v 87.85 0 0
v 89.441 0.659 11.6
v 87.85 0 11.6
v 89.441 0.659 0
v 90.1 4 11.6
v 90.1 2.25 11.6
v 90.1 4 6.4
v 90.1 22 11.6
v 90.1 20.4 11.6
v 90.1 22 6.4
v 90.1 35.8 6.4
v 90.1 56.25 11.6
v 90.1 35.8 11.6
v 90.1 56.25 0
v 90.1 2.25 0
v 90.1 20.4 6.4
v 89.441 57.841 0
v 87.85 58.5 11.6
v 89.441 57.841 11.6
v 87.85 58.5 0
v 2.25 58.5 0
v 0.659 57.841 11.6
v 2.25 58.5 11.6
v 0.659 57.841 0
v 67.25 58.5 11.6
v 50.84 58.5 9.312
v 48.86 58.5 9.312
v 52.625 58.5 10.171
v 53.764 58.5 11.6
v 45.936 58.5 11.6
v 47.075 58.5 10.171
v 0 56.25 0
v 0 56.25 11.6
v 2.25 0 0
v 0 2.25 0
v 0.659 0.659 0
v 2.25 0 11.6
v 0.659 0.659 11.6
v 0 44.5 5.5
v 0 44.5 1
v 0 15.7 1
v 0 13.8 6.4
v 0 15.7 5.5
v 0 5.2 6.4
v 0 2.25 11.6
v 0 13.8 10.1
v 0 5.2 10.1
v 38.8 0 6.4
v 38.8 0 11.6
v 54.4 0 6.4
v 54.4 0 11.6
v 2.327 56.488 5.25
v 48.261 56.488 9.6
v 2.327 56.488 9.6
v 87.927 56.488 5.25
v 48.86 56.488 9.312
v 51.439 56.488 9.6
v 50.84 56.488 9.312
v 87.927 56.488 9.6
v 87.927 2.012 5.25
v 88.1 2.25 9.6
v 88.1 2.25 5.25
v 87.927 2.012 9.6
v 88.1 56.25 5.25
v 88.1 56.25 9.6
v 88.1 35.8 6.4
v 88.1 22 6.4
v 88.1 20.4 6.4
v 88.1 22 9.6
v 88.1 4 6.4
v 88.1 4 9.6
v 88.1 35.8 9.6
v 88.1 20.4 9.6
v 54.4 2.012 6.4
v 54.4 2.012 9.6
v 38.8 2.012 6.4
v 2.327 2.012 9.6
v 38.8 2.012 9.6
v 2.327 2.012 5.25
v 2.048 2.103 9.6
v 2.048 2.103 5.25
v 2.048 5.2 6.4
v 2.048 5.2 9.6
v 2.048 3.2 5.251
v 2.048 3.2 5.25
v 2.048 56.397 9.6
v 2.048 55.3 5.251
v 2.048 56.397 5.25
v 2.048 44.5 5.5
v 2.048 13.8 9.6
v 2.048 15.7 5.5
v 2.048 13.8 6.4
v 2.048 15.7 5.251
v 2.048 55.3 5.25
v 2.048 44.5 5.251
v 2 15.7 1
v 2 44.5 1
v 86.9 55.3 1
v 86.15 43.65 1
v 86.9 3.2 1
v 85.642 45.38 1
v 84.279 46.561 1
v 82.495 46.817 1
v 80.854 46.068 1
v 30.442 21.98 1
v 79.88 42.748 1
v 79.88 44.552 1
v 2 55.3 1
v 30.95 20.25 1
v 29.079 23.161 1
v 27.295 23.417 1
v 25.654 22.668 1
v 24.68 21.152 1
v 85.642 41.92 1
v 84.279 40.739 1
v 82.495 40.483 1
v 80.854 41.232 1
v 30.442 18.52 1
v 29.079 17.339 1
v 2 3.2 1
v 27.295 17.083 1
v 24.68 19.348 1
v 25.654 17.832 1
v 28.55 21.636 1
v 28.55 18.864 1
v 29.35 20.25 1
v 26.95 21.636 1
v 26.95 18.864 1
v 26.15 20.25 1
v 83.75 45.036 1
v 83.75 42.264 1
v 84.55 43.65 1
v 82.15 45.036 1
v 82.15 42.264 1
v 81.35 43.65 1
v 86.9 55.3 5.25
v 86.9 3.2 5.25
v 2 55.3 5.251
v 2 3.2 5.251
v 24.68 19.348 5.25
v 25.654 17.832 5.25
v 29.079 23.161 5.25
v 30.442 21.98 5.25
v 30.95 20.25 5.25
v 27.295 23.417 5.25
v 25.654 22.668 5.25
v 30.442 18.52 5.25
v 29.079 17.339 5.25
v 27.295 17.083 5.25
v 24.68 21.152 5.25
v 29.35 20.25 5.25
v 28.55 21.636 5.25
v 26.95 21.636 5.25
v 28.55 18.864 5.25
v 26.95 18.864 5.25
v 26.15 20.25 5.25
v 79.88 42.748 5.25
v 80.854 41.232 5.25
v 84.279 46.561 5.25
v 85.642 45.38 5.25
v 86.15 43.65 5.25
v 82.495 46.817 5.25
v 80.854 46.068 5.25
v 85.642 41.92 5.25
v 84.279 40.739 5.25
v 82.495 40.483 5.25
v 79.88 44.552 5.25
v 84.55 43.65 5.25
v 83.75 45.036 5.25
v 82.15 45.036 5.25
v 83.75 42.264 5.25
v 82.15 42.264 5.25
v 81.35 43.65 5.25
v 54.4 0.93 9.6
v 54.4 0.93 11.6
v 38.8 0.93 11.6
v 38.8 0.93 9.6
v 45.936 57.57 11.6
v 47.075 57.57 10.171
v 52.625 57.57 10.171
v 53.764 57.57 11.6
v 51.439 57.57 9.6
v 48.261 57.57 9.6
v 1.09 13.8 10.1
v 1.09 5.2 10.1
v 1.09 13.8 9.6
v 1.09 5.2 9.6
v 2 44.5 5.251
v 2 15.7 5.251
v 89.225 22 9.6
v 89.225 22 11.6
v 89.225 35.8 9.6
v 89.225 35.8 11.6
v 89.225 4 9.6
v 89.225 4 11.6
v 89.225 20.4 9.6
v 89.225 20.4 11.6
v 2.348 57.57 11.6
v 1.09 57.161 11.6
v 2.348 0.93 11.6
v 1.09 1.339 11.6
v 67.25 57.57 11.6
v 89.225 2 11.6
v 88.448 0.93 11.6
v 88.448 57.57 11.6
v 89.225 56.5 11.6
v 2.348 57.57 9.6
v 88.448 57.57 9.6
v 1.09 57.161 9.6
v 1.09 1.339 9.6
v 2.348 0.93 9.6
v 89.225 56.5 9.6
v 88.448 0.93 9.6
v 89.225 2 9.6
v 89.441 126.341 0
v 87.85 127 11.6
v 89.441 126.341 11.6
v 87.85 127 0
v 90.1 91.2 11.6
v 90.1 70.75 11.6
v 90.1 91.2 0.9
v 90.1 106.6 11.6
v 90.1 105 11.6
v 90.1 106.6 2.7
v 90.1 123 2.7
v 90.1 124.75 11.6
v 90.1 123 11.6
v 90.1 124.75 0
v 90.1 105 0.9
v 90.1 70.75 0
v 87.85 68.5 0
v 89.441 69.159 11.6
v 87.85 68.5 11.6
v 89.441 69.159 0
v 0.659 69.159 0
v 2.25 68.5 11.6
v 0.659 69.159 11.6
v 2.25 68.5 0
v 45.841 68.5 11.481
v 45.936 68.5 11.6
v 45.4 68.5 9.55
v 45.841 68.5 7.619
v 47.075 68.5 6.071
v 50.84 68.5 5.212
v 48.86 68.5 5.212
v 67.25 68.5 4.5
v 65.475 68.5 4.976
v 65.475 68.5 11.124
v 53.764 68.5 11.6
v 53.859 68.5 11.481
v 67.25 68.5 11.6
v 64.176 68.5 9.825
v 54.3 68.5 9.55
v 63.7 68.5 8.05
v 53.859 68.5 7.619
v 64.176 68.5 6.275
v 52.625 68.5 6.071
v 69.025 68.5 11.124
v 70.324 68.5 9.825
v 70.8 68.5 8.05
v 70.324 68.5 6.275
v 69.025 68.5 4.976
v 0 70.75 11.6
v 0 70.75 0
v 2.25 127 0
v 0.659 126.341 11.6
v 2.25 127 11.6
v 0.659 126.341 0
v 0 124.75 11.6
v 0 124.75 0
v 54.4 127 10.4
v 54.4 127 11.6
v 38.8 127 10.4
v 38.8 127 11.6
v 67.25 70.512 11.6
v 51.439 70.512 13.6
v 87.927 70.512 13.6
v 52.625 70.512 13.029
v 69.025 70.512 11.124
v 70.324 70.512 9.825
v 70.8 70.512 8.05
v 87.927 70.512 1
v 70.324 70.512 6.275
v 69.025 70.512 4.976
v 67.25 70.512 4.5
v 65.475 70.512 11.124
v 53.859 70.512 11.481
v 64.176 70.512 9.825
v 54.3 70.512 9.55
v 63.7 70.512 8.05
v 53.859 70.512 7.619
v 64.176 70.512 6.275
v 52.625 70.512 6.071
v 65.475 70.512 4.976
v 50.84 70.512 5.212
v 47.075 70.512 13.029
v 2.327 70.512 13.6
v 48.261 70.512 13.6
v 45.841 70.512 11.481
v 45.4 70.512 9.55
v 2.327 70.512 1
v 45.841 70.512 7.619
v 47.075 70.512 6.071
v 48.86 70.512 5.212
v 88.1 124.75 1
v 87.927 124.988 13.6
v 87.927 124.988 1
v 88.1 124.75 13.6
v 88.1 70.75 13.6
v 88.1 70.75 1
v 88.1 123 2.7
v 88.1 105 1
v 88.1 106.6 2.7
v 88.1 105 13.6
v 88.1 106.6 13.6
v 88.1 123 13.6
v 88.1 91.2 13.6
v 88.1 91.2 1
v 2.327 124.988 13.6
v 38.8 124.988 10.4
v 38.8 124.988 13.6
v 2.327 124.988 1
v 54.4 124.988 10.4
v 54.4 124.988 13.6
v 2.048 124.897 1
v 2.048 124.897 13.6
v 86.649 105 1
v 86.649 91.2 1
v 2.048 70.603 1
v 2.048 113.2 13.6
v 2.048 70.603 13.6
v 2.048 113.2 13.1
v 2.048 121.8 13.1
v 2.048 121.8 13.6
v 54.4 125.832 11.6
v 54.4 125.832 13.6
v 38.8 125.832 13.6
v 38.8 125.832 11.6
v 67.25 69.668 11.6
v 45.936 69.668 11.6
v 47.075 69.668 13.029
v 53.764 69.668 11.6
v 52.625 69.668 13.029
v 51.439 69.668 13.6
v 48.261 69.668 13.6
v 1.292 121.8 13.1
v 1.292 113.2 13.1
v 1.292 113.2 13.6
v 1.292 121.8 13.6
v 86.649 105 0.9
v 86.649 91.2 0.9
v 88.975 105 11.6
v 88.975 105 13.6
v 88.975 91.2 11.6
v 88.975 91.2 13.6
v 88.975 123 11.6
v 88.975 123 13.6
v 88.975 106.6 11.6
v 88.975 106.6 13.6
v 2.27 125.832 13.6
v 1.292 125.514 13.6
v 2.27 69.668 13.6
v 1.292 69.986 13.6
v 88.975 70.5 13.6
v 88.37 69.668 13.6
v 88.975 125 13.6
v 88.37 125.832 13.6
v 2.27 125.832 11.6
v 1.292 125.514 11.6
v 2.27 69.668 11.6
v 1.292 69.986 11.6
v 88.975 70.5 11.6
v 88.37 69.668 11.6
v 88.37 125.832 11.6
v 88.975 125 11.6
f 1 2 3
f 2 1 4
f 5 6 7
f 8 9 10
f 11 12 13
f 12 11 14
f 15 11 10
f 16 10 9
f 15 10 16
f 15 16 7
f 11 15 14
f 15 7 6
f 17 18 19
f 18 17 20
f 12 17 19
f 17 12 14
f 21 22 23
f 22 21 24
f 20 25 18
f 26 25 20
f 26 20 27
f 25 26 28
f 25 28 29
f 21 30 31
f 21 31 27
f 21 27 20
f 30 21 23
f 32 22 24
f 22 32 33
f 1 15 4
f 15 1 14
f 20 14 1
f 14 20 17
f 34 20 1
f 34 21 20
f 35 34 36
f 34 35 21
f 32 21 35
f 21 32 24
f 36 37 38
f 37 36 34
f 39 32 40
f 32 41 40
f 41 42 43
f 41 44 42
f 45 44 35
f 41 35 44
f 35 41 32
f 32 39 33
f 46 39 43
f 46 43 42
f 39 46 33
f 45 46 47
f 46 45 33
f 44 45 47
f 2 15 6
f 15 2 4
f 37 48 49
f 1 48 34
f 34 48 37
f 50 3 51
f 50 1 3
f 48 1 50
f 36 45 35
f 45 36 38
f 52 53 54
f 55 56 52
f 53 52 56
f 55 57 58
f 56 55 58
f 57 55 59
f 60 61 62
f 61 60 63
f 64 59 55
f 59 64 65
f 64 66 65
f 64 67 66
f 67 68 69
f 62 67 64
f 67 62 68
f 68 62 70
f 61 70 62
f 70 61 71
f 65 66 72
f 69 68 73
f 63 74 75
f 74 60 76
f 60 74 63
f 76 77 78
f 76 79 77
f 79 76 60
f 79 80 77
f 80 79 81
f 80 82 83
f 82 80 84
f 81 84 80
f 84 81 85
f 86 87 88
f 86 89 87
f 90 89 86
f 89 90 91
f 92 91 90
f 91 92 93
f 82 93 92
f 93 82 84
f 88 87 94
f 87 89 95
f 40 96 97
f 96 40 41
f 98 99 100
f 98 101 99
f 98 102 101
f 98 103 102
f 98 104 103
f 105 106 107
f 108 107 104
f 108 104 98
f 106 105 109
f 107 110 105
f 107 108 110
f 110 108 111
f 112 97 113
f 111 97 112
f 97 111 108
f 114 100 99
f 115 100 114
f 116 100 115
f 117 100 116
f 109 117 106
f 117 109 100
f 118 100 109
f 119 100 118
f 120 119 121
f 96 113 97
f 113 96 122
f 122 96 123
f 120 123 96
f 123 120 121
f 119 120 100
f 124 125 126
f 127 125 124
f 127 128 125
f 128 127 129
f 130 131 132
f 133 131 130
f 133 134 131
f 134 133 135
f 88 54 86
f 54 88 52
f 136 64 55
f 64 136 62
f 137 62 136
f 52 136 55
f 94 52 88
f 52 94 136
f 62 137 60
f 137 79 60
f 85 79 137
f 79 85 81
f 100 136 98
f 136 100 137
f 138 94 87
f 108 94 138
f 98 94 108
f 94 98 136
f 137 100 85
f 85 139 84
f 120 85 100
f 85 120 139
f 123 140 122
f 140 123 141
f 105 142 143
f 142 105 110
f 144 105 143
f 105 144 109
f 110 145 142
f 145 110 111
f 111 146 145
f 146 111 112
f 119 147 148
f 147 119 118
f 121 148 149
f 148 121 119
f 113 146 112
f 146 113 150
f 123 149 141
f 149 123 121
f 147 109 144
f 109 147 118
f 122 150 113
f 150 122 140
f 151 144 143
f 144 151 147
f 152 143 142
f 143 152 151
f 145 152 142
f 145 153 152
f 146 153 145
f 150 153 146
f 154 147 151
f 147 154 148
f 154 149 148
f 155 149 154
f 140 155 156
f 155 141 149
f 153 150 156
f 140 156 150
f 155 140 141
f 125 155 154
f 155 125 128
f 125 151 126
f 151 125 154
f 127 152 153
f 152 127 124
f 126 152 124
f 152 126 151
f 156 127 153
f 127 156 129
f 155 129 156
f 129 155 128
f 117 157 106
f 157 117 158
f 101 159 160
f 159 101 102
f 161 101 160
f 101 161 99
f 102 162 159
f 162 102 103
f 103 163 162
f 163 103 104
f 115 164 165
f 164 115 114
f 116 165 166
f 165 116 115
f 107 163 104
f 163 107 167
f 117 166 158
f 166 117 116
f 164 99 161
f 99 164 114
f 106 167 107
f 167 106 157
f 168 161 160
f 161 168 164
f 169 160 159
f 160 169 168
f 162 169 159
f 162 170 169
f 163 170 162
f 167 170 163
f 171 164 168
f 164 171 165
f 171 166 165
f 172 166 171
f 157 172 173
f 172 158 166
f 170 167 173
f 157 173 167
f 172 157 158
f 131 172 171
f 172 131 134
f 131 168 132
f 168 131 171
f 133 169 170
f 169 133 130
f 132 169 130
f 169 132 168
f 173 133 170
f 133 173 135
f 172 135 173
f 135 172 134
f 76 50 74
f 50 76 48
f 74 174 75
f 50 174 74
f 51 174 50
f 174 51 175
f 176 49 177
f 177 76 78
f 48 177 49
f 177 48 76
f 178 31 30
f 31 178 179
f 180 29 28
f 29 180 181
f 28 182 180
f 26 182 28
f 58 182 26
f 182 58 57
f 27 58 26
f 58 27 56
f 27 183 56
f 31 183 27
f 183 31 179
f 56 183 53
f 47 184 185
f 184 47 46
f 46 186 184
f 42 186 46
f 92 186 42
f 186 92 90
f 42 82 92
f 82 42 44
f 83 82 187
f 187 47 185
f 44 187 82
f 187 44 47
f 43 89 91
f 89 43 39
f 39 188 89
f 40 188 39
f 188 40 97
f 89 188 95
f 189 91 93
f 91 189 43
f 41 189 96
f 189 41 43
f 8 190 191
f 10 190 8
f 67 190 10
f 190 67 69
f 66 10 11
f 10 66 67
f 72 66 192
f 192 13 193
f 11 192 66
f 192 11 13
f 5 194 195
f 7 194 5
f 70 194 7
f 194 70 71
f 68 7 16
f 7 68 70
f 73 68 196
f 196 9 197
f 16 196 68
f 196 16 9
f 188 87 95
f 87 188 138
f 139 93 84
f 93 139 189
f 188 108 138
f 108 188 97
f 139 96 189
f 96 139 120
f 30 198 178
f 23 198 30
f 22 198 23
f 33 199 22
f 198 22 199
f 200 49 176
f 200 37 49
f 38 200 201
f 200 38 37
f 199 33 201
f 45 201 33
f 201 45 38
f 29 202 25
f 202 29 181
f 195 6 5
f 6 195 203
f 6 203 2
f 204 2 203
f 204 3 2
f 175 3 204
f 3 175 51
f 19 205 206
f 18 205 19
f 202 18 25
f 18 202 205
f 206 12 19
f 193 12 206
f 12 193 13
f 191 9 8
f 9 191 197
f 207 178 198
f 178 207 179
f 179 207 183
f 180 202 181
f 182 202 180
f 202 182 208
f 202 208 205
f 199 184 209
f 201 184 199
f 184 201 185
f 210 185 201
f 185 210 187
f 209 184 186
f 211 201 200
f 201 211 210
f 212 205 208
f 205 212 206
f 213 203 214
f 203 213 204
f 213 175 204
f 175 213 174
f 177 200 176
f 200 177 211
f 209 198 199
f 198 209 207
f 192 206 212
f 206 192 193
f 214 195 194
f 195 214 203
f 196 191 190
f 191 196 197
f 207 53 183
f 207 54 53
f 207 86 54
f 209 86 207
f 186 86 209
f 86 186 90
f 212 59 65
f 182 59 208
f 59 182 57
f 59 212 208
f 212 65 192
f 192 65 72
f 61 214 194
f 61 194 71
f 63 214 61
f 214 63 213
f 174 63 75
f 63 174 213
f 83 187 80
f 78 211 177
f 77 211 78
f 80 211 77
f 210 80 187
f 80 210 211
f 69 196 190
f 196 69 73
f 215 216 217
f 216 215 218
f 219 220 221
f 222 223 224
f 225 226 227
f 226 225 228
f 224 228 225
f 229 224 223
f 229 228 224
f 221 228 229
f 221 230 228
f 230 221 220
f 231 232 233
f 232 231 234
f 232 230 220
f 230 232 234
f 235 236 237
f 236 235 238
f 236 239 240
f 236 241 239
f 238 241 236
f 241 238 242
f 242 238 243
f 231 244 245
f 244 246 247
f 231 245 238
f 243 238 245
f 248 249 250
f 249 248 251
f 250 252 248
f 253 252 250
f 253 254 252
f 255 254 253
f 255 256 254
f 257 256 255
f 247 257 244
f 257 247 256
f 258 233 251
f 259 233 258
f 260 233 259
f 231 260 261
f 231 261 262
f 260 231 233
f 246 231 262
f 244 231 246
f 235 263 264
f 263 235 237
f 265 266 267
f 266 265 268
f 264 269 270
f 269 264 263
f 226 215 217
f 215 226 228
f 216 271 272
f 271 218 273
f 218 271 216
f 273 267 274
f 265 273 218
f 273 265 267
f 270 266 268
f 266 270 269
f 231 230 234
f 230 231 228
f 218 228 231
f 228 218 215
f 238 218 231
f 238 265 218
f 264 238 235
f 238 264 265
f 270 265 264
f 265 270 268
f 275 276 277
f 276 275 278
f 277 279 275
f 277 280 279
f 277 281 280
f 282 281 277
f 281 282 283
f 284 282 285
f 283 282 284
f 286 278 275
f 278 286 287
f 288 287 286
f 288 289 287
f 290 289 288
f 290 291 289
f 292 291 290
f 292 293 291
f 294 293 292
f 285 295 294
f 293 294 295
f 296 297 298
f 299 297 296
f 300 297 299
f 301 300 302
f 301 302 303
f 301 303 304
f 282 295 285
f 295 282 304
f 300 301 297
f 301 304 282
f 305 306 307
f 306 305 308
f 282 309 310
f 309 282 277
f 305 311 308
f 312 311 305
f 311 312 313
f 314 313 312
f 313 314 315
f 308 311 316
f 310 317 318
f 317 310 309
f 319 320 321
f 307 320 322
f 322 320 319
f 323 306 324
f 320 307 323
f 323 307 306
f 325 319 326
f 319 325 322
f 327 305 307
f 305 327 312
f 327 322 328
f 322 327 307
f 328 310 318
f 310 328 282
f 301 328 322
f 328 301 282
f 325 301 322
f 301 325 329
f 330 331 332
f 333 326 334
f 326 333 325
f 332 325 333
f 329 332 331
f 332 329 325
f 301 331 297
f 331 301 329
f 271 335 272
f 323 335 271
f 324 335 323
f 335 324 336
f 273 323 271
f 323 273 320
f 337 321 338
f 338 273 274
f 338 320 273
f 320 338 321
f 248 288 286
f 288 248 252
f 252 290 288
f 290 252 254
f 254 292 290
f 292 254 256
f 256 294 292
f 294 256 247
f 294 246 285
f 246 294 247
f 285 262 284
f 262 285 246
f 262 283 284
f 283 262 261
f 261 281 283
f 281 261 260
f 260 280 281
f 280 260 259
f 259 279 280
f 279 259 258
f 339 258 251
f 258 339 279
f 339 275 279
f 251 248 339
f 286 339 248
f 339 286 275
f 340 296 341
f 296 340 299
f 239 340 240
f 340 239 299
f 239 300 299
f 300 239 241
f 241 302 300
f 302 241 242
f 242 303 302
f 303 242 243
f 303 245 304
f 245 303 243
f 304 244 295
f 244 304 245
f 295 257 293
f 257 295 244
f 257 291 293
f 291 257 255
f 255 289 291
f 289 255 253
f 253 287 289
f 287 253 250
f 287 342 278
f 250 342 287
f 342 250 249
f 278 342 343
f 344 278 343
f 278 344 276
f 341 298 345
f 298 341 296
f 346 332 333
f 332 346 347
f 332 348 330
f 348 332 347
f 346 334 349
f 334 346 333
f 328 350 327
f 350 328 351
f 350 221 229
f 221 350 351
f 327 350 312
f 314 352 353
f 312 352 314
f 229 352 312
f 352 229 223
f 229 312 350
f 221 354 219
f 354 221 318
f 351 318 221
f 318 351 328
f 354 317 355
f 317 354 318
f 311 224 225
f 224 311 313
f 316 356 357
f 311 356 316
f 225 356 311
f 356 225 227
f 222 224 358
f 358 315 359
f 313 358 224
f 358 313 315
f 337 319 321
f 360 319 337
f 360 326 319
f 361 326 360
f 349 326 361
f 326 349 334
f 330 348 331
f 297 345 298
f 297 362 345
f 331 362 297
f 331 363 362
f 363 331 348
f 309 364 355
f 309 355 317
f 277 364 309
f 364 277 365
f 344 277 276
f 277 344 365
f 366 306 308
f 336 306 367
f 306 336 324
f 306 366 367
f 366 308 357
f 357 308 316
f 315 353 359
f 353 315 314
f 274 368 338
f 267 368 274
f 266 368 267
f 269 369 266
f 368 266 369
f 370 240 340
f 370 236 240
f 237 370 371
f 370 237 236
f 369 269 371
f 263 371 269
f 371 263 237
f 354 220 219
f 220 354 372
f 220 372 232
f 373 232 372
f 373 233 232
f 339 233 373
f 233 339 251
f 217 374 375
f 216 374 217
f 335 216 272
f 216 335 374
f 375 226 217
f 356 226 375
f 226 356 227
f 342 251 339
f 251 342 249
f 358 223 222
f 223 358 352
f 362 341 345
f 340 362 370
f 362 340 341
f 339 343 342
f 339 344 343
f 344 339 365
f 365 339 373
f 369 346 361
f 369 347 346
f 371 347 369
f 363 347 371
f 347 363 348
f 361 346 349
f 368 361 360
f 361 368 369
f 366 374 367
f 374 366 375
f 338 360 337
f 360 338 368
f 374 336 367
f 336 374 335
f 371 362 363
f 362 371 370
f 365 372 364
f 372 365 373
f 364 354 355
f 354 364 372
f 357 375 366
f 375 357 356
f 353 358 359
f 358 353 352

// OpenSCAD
// file: lib_metric_sizes.scad
m2   = 2.8;
m2_5 = 3.2;
m3   = 3.6;
m4   = 4.8;
m5   = 5.6;
m6   = 6.4;
// file: lib_nuts.scad
include <lib_metric_sizes.scad>

m2_nut = [5.2, 1.7];
m3_nut = [6.8, 2.3];
m4_nut = [8.4, 2.8];

m2_flat_nut = [5.2, 2.0];
m3_flat_nut = [6.8, 2.0];
m4_flat_nut = [8.4, 2.0];

//m2_nylon_nut = [, ];
//m2_5_nylon_nut = [, ];
//m3_nylon_nut = [, ];
m4_nylon_nut = [8.4, 3.3];
m5_nylon_nut = [10.0, 4.0];
m6_nylon_nut = [12.4, 5.0];
// file: lib_self_tapping_screws.scad
include <lib_metric_sizes.scad>

m3_st_roundhead = [7.2, 2.0];
m3_st_flathead = [7.2, 0];
// file: lib_machine_screws.scad
include <lib_metric_sizes.scad>

m2x12_shaft = [m2, 12.0];
m2x19_shaft = [m2, 19.0];
m3x12_shaft = [m3, 12.0];
m3x17_shaft = [m3, 17.0];
m3x19_shaft = [m3, 19.0];
m4x12_shaft = [m4, 12.0];
m4x25_shaft = [m4, 25.0];

m2_roundhead = [4.0, 1.0];
m3_roundhead = [5.6, 1.7];
m4_roundhead = [7.2, 2.3];

m2_flathead = [4.0, 1.0];
m3_flathead = [5.6, 1.0];
m4_flathead = [7.2, 1.0];
// file: lib_gadgets.scad
include <lib_machine_screws.scad>
include <lib_self_tapping_screws.scad>
include <lib_nuts.scad>

module stud(shaft, self_tapping=false)
{
	ds = self_tapping ? shaft[0]-0.4 : shaft[0];
	
	cylinder(h=shaft[1], d=ds);
}

module bolt(head, shaft, countersink=false, self_tapping=false) {
	ds = self_tapping ? shaft[0]-0.4 : shaft[0];
	
	cylinder(h=head[1], d=head[0]);
	cylinder(h=shaft[1]+head[1], d=ds);
	if (countersink == true) {
		translate([0, 0, head[1]]) {
			cylinder(h=head[0], d1=head[0], d2=0);
		}
	}
}

module nut(head, countersink=false) {
	cylinder(h=head[1], d=head[0], $fn=6);
	if (countersink == true) {
		translate([0, 0, head[1]]) {
			cylinder(h=head[0], d1=head[0], d2=0, $fn=6);
		}
	}
}

module post(pos, radius, height) {
	translate([pos[0], pos[1], 0]) { 
		cylinder(h=height, r=radius); 
	}
}

module spacer(pos, outer_r, inner_r, height) {
	translate([pos[0], pos[1], 0]) { 
		difference() {
			cylinder(h=height, r=outer_r); 
			if (inner_r > 0) {
				cylinder(h=height+0.0001, r=inner_r); 
			}
		}
	}
}

module grid(size, xx, yy) {
	if (size > 0) {
		for (x = [0 : size : xx] ) {
			translate([x, 0, 0]) cube([0.8, yy, 0.4]);
		}
		for (y = [0 : size : yy] ) {
			translate([0, y, 0]) cube([xx, 0.8, 0.4]);
		}
	}
}
// file: lib_soft.scad
/** 
 * An OpenSCAD library for creating shapes with rounded edges
 *
 * @author Paul Generes <paul.generes@gmail.com>
 * @example soft_example.scad
 */
 
module soft_cube(size=[1, 1, 1], center=false, cr=1) {
	tr = [cr, cr, cr];

    translate(tr) {
        minkowski() {
            sphere(cr);
            cube([size[0]-2*cr, size[1]-2*cr, size[2]-2*cr], center);
        }
    }
}

module softxyz_cube(size=1, center=false, cr=[1, 1, 1]) {
	tr = cr;

    translate(tr) {
        minkowski() {
			scale(cr) {
				sphere(1);
			}
            cube([size[0]-2*cr[0], size[1]-2*cr[1], size[2]-2*cr[2]], center);
        }
    }
}

module softz_cube(size=1, center=false, cr=1) {
	tr = [cr, cr, 0];

    translate(tr) {
        minkowski() {
			cylinder(h=0.00001, r=cr);
			cube([size[0]-2*cr, size[1]-2*cr, size[2]-0.00001], center);
        }
    }
}
// file: lib_raspi_b_enclosure.scad
// Raspberry Pi Model B Enclosure Library

/*
Board: 85 x 54 x 1.5
Right:
	RJ45: 15.9 x 13.6 @ 2, 1.5
	USB: 13.3 x 15.4 @ 20, 1.5
Left:
	SD Card Slot:  28.3 x 4, @ 12, -4
	Micro USB: 8.1 x 3.2 @ 42.7 , 1.5
Front:
	HDMI: 15.1 x 5.9 @ 36.8, 1.5
Back:
	Audio Jack: 6.6 @ 20.6, 8.5
	Composite Video: 8.4 @ 38, 7
*/


include <lib_enclosure.scad>

// variables
function fillet_z()         = 0;
function tolerance()        = 0.25;
function device_x()         = 85.6;
function device_y()         = 54.0;
function pcb_z()            = 1.4;
function spacing()          = 10.0;
function riser_z()          = 4.0;
function riser_thickness()  = 1.2;
function wall_thickness()   = 2;
function bottom_thickness() = 1;
function top_thickness()    = 1;
function device_z()         = pcb_z() + 15.3;
function friction()         = wall_thickness();
function split()            = outer_z() / 2;

module right_cutouts(is_bottom) {
	square_cutout([2.0+15.9/2,       pcb_z()+13.6/2], [15.9, 13.6]); // rj45 (15.9x13 @ 2x1.4)
	square_cutout([20+13.3/2, pcb_z()+15.4/2], [13.3, 15.4]); // usb

	extra_right_cutouts(is_bottom);
}

module left_cutouts(is_bottom) {
	square_cutout([12+28.3/2,  -4/2],        [28.3,     4]);   // sd card
	square_cutout([42.7+8.1/2, pcb_z()+3.2/2], [8.1,   3.2]); // power

	extra_left_cutouts(is_bottom);
}

module front_cutouts(is_bottom) {
	square_cutout([36.8+15.1/2, pcb_z()+5.9/2], [15.1, 5.9]); // hdmi

	if (is_bottom) {
		square_cutout([36.8+15.1/2, pcb_z()+device_z()/2], [15.1, device_z()]); // hdmi
	}

	extra_front_cutouts(is_bottom);
}

module back_cutouts(is_bottom) {
	circle_cutout([20.6, pcb_z()+8.5], 6.6/2); // audio
	circle_cutout([38, pcb_z()+7],     8.4/2); // video
	//circle_cutout([85.0-40.6-9.8/2-1.0, pcb_z()+6.5],       8.3/2+1); // video (is this for the older b?)
	//translate([50.80,          4], [33.20,          20.00]); // gpio header
	//translate([46.00,          4], [            50.00,          20.00]); // gpio ribbon
	//translate([50.80,          4], [ 33.2, 10]); // little gpio ribbon

	if (is_bottom) {
		//square_cutout([14.0+12.0/2,         pcb_z()+3.0+6.7/2+device_z()/2+0.5], [6.7+2, device_z()]); // audio
		//square_cutout([85.0-40.6-9.8/2-1.0, pcb_z()+4.0+8.3/2+device_z()/2],     [8.3+2, device_z()]); // video
		//square_cutout([85.0-40.6-9.8/2-1.0, pcb_z()+6.5-8.3/2], [8.3+2, 8.3+2]); // video (is this for the older b?)
	} else {
		//square_cutout([14.0+12.0/2,         pcb_z()+3.0+6.7/2+0.5-device_z()/2], [6.7+2, device_z()]); // audio
		//square_cutout([85.0-40.6-9.8/2-1.0, pcb_z()+4.0+8.3/2-device_z()/2],     [8.3+2, device_z()]); // video
		//square_cutout([85.0-40.6-9.8/2-1.0, pcb_z()+6.5-8.3/2], [8.3+2, 8.3+2]); // video (is this for the older b?)
	}

	extra_back_cutouts(is_bottom);
}

module top_cutouts() {
	//translate([                        19.00,           71.00], [              18.00,             1.50]); // dsi
	//translate([                         2.00,           25.00], [              18.00,             1.50]); // csi
	//translate([                  2,    -1], [   15.4, 21.2]); // rj45 (for super short enclosures)
	//square_cutout([device_y-18.8-13.25,  -7.7], [  13.25, 17.2]); // usb (for super short enclosures)
	//translate([      device_y-11.4,    14], [ 11.4+4,   12]); // audio (for super short enclosures)
	//translate([    device_y-2.1-10,    34], [ 10+2.1,   10]); // video (for super short enclosures)
	//translate([              49.00, 50.80], [5.5+1.5, 33.2]); // gpio header
	//translate([              49.00, 46.00], [5.5+1.5,               50]); // gpio ribbon

	extra_top_cutouts();
}

module bottom_cutouts() {
	extra_bottom_cutouts();
}

module cutouts(is_bottom) {
	// Cut away the riser adjacent to the SD card bracket.
	translate([wall_thickness(), wall_thickness()+riser_thickness(), bottom_thickness()])
	    cube([riser_thickness()+0.0001, inner_y()-2*riser_thickness(), triser_z()+0.001]);

	extra_cutouts(is_bottom);
}

module feet(pos) {
	bottom_face() {
		translate([pos,            pos, 0])            cylinder(h=0.8, r=3.6);
		translate([pos,            device_y()-pos, 0]) cylinder(h=0.8, r=3.6);
		translate([device_x()-pos, pos, 0])            cylinder(h=0.8, r=3.6);
		translate([device_x()-pos, device_y()-pos, 0]) cylinder(h=0.8, r=3.6);
	}
}

module stand_offs() {
	stand_off([25.5,            18.0],             3.2, 1.6);
	stand_off([device_x()-4.90, device_y()-12.60], 3.2, 1.6);
}

module stand_ons() {
	stand_on([25.5,            18.0],             3.2, 1.6);
	stand_on([device_x()-4.90, device_y()-12.60], 3.2, 1.6);
}

module led_window() {
	square_cutout([ 1.0+12.0/2,         pcb_z()+1.6/2],         [12.00, 1.6]);
}

module attachments() {}
module final_attachments() {}

module extra_front_cutouts(){}
module extra_back_cutouts(){}
module extra_left_cutouts(){}
module extra_right_cutouts(){}
module extra_top_cutouts(){}
module extra_bottom_cutouts(){}
module extra_cutouts(){}
// main file
// example raspberry pi model b

include <lib_raspi_b_enclosure.scad>

enclosure();
